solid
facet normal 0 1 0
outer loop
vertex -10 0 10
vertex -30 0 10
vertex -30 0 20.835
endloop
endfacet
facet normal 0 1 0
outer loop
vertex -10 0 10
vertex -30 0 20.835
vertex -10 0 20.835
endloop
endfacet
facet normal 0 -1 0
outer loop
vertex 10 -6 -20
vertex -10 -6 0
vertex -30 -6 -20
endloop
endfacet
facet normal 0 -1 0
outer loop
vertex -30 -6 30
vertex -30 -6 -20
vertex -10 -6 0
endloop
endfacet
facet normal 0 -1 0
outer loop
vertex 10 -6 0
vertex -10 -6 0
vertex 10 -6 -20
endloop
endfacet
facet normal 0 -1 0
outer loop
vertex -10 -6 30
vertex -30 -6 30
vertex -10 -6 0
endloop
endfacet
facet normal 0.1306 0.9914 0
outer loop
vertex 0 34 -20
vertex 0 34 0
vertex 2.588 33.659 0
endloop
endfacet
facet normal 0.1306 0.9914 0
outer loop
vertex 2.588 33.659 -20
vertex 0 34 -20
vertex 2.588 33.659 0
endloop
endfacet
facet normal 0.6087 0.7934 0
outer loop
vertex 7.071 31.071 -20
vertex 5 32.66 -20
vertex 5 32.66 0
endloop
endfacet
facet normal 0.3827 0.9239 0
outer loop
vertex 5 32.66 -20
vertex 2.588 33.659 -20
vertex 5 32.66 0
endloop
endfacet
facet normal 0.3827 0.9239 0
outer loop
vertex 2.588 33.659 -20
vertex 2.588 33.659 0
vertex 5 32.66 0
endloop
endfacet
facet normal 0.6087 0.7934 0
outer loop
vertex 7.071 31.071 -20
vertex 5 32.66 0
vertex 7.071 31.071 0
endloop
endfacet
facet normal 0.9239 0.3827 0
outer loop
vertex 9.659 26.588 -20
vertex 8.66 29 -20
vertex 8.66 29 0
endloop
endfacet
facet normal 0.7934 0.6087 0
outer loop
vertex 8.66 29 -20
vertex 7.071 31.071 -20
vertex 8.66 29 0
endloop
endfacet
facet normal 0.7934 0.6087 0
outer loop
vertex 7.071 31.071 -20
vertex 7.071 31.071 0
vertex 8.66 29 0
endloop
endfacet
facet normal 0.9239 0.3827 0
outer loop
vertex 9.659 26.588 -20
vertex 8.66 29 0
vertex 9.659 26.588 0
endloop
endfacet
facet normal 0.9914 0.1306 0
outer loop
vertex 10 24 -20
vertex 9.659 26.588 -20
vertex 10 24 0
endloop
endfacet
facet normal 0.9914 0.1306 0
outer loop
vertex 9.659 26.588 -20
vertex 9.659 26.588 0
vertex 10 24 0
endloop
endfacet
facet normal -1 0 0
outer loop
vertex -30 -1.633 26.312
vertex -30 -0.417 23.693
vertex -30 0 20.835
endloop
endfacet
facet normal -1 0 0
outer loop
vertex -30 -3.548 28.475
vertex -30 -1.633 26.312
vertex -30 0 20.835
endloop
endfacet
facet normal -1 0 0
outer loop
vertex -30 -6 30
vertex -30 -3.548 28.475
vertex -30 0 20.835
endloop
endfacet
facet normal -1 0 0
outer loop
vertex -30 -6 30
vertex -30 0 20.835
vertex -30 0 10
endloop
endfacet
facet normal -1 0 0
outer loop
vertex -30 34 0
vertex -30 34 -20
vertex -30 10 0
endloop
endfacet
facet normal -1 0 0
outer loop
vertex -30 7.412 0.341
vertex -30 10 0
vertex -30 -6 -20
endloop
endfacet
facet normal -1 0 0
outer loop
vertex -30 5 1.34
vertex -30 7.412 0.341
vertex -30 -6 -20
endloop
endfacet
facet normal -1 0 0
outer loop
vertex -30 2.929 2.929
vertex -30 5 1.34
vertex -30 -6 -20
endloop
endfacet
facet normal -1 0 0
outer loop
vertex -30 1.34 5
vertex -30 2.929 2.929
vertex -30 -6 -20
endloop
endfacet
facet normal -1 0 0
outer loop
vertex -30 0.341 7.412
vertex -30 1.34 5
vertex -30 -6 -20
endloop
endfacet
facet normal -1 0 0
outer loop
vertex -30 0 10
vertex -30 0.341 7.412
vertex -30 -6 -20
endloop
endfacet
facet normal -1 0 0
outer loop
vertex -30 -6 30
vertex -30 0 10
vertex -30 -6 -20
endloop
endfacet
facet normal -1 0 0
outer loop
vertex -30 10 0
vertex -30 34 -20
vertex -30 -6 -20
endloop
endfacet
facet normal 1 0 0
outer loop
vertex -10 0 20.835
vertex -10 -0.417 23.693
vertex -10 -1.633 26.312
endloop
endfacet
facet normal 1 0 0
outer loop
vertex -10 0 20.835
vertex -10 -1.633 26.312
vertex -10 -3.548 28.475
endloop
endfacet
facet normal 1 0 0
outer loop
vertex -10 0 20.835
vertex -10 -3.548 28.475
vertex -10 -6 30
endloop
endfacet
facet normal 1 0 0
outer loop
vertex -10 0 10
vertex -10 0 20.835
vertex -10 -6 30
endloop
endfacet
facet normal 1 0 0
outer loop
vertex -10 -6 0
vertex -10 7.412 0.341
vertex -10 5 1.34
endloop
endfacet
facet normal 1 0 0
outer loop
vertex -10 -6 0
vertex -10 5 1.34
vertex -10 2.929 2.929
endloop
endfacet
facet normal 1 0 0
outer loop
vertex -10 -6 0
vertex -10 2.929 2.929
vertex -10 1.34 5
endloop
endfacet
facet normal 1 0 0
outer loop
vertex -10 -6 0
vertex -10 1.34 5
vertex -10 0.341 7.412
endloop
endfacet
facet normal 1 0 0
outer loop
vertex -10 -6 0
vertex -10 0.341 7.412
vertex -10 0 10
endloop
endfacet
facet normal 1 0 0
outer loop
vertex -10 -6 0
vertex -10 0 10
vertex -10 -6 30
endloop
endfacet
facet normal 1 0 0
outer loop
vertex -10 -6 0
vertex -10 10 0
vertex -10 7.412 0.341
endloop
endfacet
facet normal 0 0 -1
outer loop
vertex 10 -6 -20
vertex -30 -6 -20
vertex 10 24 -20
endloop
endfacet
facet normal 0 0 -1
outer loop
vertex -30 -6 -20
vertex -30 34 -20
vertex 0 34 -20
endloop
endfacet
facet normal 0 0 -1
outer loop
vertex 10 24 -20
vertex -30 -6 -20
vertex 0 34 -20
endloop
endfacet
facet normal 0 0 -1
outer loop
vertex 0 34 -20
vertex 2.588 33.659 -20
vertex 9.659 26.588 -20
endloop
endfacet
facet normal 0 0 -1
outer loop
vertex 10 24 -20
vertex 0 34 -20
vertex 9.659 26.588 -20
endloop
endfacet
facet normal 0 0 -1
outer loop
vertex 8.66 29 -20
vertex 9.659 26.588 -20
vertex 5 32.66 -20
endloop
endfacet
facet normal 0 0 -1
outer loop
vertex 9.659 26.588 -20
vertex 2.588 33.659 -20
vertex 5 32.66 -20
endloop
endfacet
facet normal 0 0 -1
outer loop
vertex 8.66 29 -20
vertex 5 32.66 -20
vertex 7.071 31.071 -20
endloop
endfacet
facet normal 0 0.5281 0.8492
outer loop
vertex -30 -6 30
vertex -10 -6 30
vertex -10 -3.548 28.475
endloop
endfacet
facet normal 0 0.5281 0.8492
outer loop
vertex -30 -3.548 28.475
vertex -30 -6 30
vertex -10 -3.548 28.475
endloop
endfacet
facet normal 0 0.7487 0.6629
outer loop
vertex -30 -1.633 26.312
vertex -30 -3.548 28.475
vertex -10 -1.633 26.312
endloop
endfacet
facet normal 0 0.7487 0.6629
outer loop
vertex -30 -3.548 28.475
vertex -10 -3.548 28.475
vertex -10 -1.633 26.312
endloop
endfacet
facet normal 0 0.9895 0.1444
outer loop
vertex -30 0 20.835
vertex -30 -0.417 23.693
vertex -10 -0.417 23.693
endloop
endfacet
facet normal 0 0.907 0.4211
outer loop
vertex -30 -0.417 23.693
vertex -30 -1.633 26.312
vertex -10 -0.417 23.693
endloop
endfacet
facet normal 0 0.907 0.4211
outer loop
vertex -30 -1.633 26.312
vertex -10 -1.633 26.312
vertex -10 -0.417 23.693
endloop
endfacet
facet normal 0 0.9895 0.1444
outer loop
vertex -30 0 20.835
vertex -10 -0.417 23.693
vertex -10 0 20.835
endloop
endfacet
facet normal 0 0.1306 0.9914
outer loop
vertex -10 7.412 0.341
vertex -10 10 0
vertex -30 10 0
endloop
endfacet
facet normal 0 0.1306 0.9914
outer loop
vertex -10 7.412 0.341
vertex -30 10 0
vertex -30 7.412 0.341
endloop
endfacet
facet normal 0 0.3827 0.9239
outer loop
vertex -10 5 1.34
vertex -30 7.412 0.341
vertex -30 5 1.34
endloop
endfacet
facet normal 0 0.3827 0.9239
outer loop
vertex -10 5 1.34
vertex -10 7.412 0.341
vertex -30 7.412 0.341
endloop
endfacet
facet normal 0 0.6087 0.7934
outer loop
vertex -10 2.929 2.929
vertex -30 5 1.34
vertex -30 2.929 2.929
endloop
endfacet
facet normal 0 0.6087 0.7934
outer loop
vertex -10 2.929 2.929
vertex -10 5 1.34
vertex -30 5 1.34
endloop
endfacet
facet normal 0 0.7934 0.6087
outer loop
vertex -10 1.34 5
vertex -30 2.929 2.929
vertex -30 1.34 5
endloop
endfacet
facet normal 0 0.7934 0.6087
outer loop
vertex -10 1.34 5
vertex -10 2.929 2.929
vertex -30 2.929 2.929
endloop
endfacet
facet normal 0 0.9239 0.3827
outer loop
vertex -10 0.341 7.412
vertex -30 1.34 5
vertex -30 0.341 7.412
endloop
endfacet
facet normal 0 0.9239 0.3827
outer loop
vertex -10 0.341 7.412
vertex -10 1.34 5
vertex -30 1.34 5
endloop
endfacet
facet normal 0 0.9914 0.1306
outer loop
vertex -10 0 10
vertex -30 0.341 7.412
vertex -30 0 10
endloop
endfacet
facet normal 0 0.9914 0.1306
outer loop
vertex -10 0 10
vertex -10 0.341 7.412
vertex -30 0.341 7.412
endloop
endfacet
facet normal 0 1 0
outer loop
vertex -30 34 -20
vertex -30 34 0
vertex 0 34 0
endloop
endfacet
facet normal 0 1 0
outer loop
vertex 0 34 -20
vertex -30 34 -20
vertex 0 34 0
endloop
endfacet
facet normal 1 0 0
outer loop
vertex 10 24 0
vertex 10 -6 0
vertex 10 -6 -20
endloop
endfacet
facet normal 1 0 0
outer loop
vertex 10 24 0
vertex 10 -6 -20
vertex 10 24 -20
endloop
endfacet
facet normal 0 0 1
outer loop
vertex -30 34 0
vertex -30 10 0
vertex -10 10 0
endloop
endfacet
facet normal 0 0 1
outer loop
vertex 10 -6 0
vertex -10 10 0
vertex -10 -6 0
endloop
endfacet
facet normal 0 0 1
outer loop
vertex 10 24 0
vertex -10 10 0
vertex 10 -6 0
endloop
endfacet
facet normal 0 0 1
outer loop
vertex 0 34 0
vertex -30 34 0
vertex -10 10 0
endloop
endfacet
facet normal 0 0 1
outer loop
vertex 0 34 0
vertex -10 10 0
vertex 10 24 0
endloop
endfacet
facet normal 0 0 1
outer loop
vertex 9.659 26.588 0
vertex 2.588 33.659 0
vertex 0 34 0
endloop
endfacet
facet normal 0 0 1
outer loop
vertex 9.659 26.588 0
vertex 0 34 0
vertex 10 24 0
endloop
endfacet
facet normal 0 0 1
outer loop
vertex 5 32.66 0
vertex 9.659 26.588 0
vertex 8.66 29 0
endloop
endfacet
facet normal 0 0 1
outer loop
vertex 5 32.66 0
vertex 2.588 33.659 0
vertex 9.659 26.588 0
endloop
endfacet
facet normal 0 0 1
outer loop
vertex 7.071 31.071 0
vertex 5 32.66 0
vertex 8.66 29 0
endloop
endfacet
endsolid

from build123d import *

# Parameters (mm, degrees)
SKETCH1_W           = 20
SKETCH1_H           = 6
BOSS_EXTRUDE1_DEPTH = 30
SKETCH2_W           = 40
SKETCH2_H           = 40
BOSS_EXTRUDE2_DEPTH = 20
FILLET1_R           = 10


with BuildPart() as part:
    # Sketch1 → Boss-Extrude1 (new body)
    with BuildSketch(Plane.XY):
        with Locations((-20, -3)):
            Rectangle(SKETCH1_W, SKETCH1_H)
    extrude(amount=BOSS_EXTRUDE1_DEPTH)

    # Sketch2 → Boss-Extrude2 (add)
    with BuildSketch(Plane.XY):
        with Locations((-10, 14)):
            Rectangle(SKETCH2_W, SKETCH2_H)
    extrude(amount=-BOSS_EXTRUDE2_DEPTH)

    # Fillet1
    # the kernel refuses this fillet: 10 mm, written as the material it adds along each edge
    with BuildSketch(Plane(origin=(-10, 0, 0), x_dir=(0, 1, 0), z_dir=(-1, 0, 0))) as fillet1_piece_1:
        with BuildLine():
            CenterArc((FILLET1_R, -FILLET1_R), FILLET1_R, 90, 90)
            Line((0, -FILLET1_R), (0, 0))
            Line((0, 0), (FILLET1_R, 0))
        make_face()
    extrude(amount=20)
    # the kernel refuses this fillet: 10 mm, written as the material it takes off along each edge
    with BuildSketch(Plane(origin=(10, 34, 25), x_dir=(-1, 0, 0), z_dir=(0, 0, -1))) as fillet1_2_piece_1:
        with BuildLine():
            CenterArc((FILLET1_R, -FILLET1_R), FILLET1_R, 90, 90)
            Line((0, -FILLET1_R), (0, 0))
            Line((0, 0), (FILLET1_R, 0))
        make_face()
    extrude(amount=70, mode=Mode.SUBTRACT)
    with BuildSketch(Plane(origin=(12.912878475, 0, 30), x_dir=(0, 0, -1), z_dir=(-1, 0, 0))) as fillet1_2_piece_2:
        with BuildLine():
            CenterArc((9.16515139, 10), FILLET1_R, 203.578178478, 66.421821522)
            Line((0, 6), (0, 0))
            Line((0, 0), (9.16515139, 0))
        make_face()
    extrude(amount=65.82575695, mode=Mode.SUBTRACT)


solid = part.part
